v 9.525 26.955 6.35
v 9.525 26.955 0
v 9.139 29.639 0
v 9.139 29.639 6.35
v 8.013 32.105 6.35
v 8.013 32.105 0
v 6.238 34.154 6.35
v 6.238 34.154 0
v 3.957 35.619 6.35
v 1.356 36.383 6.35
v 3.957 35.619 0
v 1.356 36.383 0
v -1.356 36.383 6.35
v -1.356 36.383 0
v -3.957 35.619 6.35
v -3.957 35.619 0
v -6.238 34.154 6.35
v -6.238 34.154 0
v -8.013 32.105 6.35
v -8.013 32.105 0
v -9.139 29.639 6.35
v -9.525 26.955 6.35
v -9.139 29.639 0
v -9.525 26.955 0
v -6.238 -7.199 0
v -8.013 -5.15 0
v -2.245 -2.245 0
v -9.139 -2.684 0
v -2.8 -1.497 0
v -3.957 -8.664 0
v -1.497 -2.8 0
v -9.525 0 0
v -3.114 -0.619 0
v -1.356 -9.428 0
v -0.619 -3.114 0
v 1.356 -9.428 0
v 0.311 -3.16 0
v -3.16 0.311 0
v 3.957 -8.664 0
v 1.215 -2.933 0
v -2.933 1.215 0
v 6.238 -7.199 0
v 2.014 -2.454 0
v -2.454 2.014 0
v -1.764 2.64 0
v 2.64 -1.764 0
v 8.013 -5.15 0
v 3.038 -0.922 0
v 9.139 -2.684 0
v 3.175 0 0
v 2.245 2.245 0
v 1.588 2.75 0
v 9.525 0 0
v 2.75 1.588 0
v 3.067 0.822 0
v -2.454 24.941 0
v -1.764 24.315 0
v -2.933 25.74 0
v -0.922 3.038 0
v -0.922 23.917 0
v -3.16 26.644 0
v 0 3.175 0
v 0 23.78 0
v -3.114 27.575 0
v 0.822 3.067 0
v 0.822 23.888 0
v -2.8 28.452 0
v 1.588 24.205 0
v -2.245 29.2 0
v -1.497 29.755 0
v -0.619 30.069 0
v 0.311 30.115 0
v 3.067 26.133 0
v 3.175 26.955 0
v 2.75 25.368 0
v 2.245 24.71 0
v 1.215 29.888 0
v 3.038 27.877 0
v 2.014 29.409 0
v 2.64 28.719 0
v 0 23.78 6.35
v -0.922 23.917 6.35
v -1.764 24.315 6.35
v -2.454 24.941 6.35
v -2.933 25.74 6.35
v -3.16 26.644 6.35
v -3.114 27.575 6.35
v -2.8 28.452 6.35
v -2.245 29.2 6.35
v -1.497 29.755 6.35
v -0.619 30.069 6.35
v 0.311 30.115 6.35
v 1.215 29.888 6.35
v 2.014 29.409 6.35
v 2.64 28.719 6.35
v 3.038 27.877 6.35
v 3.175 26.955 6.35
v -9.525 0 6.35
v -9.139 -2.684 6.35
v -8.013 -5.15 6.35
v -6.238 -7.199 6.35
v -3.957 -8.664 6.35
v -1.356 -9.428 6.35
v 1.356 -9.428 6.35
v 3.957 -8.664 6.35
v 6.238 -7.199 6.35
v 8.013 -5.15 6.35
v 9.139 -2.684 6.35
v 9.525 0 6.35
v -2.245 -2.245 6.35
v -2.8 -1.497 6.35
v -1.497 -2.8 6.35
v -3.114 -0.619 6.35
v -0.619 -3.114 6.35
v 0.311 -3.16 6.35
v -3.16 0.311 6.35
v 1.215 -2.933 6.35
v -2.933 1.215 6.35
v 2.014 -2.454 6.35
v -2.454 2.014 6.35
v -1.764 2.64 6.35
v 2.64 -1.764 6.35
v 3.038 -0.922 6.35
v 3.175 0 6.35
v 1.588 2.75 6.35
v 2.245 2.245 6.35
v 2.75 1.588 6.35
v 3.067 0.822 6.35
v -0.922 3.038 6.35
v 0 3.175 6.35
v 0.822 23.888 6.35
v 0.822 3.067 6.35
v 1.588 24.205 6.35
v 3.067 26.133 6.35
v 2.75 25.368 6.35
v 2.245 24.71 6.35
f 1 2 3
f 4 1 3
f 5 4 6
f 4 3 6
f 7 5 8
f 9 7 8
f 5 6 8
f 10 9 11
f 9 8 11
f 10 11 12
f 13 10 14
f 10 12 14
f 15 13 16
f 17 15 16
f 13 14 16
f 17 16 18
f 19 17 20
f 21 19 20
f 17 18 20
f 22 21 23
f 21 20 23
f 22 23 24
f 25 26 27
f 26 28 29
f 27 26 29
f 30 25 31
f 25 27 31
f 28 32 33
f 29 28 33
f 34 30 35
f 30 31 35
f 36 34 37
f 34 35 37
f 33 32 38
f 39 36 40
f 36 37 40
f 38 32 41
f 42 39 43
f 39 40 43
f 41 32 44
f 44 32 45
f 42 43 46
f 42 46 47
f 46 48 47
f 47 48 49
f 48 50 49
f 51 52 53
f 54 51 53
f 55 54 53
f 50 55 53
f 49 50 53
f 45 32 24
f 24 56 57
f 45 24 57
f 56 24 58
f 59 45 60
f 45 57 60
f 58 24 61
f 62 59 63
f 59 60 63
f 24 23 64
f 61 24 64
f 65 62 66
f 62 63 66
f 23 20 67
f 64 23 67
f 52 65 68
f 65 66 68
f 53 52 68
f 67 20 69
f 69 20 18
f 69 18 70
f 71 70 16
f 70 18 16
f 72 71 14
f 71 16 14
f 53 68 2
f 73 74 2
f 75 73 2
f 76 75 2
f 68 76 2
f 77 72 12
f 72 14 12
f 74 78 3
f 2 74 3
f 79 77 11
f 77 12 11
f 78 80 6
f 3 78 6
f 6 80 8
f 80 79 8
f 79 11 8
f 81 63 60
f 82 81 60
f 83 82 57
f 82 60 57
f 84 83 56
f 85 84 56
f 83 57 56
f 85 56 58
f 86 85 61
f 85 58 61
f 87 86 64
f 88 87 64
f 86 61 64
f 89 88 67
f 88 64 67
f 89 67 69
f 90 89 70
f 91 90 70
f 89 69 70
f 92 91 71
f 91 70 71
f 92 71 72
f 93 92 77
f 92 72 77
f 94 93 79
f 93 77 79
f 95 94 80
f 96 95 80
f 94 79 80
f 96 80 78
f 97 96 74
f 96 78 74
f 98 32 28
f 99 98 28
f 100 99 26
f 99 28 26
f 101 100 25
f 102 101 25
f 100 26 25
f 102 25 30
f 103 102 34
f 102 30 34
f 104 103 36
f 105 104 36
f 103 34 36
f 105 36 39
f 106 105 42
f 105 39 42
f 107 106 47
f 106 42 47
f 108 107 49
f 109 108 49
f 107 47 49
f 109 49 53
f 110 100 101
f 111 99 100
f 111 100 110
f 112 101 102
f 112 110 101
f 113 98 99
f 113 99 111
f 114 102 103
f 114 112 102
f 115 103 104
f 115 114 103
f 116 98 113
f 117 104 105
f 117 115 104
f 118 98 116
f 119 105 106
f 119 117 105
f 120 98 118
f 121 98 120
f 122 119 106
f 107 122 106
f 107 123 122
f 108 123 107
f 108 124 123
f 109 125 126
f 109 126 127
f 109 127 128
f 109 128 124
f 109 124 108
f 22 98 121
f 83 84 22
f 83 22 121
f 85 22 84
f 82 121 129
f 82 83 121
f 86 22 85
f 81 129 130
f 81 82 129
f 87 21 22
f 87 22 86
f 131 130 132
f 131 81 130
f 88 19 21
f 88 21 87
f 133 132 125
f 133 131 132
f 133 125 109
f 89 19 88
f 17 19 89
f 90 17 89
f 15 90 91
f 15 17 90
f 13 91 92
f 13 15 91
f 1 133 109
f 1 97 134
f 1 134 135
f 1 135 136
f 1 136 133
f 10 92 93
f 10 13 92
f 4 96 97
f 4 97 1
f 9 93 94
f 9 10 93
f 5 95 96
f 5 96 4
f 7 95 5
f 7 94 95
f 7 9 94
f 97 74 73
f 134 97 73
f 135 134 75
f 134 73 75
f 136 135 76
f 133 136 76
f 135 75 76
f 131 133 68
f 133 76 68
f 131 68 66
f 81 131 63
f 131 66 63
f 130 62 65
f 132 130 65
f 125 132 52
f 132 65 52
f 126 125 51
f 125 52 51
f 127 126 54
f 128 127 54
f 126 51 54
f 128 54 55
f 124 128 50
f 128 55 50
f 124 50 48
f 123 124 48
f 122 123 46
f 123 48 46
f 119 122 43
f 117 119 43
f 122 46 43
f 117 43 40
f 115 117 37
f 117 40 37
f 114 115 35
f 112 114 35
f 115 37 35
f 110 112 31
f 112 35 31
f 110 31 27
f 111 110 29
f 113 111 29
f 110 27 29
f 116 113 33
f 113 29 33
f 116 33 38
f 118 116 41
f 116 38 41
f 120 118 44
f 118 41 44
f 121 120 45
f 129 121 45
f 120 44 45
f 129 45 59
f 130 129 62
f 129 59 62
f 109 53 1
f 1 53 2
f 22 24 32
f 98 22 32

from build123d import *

# Parameters (mm, degrees)
F1_DEPTH = 6.35


with BuildPart() as f1:
    # F0 (on Top) → F1 (new body)
    with BuildSketch(Plane.XY):
        with BuildLine():
            ThreePointArc((9.525, 0), (6.7351920908, 6.7351920908), (0, 9.525))
            ThreePointArc((0, 9.525), (-6.7351920908, 6.7351920908), (-9.525, 0))
            ThreePointArc((-9.525, 0), (0, -9.525), (9.525, 0))
        make_face()
        with BuildLine():
            ThreePointArc((3.175, 0), (-2.2450640303, -2.2450640303), (0, 3.175))
            ThreePointArc((0, 3.175), (2.2450640303, 2.2450640303), (3.175, 0))
        make_face(mode=Mode.SUBTRACT)
        with BuildLine():
            ThreePointArc((-9.525, 0), (-6.7351920908, 6.7351920908), (0, 9.525))
            Line((0, 9.525), (0, 17.430102046))
            ThreePointArc((0, 17.430102046), (-6.7351920908, 20.2199099552), (-9.525, 26.955102046))
            Line((-9.525, 26.955102046), (-9.525, 0))
        make_face()
        with BuildLine():
            Line((0, 17.430102046), (0, 9.525))
            ThreePointArc((0, 9.525), (6.7351920908, 6.7351920908), (9.525, 0))
            Line((9.525, 0), (9.525, 26.955102046))
            ThreePointArc((9.525, 26.955102046), (6.7351920908, 20.2199099552), (0, 17.430102046))
        make_face()
        with BuildLine():
            ThreePointArc((-9.525, 26.955102046), (-6.7351920908, 20.2199099552), (0, 17.430102046))
            Line((0, 17.430102046), (0, 23.780102046))
            ThreePointArc((0, 23.780102046), (-2.2450640303, 29.2001660763), (3.175, 26.955102046))
            Line((3.175, 26.955102046), (9.525, 26.955102046))
            ThreePointArc((9.525, 26.955102046), (0, 36.480102046), (-9.525, 26.955102046))
        make_face()
        with BuildLine():
            Line((0, 23.780102046), (0, 17.430102046))
            ThreePointArc((0, 17.430102046), (6.7351920908, 20.2199099552), (9.525, 26.955102046))
            Line((9.525, 26.955102046), (3.175, 26.955102046))
            ThreePointArc((3.175, 26.955102046), (2.2450640303, 24.7100380157), (0, 23.780102046))
        make_face()
    extrude(amount=F1_DEPTH)


solid = f1.part
